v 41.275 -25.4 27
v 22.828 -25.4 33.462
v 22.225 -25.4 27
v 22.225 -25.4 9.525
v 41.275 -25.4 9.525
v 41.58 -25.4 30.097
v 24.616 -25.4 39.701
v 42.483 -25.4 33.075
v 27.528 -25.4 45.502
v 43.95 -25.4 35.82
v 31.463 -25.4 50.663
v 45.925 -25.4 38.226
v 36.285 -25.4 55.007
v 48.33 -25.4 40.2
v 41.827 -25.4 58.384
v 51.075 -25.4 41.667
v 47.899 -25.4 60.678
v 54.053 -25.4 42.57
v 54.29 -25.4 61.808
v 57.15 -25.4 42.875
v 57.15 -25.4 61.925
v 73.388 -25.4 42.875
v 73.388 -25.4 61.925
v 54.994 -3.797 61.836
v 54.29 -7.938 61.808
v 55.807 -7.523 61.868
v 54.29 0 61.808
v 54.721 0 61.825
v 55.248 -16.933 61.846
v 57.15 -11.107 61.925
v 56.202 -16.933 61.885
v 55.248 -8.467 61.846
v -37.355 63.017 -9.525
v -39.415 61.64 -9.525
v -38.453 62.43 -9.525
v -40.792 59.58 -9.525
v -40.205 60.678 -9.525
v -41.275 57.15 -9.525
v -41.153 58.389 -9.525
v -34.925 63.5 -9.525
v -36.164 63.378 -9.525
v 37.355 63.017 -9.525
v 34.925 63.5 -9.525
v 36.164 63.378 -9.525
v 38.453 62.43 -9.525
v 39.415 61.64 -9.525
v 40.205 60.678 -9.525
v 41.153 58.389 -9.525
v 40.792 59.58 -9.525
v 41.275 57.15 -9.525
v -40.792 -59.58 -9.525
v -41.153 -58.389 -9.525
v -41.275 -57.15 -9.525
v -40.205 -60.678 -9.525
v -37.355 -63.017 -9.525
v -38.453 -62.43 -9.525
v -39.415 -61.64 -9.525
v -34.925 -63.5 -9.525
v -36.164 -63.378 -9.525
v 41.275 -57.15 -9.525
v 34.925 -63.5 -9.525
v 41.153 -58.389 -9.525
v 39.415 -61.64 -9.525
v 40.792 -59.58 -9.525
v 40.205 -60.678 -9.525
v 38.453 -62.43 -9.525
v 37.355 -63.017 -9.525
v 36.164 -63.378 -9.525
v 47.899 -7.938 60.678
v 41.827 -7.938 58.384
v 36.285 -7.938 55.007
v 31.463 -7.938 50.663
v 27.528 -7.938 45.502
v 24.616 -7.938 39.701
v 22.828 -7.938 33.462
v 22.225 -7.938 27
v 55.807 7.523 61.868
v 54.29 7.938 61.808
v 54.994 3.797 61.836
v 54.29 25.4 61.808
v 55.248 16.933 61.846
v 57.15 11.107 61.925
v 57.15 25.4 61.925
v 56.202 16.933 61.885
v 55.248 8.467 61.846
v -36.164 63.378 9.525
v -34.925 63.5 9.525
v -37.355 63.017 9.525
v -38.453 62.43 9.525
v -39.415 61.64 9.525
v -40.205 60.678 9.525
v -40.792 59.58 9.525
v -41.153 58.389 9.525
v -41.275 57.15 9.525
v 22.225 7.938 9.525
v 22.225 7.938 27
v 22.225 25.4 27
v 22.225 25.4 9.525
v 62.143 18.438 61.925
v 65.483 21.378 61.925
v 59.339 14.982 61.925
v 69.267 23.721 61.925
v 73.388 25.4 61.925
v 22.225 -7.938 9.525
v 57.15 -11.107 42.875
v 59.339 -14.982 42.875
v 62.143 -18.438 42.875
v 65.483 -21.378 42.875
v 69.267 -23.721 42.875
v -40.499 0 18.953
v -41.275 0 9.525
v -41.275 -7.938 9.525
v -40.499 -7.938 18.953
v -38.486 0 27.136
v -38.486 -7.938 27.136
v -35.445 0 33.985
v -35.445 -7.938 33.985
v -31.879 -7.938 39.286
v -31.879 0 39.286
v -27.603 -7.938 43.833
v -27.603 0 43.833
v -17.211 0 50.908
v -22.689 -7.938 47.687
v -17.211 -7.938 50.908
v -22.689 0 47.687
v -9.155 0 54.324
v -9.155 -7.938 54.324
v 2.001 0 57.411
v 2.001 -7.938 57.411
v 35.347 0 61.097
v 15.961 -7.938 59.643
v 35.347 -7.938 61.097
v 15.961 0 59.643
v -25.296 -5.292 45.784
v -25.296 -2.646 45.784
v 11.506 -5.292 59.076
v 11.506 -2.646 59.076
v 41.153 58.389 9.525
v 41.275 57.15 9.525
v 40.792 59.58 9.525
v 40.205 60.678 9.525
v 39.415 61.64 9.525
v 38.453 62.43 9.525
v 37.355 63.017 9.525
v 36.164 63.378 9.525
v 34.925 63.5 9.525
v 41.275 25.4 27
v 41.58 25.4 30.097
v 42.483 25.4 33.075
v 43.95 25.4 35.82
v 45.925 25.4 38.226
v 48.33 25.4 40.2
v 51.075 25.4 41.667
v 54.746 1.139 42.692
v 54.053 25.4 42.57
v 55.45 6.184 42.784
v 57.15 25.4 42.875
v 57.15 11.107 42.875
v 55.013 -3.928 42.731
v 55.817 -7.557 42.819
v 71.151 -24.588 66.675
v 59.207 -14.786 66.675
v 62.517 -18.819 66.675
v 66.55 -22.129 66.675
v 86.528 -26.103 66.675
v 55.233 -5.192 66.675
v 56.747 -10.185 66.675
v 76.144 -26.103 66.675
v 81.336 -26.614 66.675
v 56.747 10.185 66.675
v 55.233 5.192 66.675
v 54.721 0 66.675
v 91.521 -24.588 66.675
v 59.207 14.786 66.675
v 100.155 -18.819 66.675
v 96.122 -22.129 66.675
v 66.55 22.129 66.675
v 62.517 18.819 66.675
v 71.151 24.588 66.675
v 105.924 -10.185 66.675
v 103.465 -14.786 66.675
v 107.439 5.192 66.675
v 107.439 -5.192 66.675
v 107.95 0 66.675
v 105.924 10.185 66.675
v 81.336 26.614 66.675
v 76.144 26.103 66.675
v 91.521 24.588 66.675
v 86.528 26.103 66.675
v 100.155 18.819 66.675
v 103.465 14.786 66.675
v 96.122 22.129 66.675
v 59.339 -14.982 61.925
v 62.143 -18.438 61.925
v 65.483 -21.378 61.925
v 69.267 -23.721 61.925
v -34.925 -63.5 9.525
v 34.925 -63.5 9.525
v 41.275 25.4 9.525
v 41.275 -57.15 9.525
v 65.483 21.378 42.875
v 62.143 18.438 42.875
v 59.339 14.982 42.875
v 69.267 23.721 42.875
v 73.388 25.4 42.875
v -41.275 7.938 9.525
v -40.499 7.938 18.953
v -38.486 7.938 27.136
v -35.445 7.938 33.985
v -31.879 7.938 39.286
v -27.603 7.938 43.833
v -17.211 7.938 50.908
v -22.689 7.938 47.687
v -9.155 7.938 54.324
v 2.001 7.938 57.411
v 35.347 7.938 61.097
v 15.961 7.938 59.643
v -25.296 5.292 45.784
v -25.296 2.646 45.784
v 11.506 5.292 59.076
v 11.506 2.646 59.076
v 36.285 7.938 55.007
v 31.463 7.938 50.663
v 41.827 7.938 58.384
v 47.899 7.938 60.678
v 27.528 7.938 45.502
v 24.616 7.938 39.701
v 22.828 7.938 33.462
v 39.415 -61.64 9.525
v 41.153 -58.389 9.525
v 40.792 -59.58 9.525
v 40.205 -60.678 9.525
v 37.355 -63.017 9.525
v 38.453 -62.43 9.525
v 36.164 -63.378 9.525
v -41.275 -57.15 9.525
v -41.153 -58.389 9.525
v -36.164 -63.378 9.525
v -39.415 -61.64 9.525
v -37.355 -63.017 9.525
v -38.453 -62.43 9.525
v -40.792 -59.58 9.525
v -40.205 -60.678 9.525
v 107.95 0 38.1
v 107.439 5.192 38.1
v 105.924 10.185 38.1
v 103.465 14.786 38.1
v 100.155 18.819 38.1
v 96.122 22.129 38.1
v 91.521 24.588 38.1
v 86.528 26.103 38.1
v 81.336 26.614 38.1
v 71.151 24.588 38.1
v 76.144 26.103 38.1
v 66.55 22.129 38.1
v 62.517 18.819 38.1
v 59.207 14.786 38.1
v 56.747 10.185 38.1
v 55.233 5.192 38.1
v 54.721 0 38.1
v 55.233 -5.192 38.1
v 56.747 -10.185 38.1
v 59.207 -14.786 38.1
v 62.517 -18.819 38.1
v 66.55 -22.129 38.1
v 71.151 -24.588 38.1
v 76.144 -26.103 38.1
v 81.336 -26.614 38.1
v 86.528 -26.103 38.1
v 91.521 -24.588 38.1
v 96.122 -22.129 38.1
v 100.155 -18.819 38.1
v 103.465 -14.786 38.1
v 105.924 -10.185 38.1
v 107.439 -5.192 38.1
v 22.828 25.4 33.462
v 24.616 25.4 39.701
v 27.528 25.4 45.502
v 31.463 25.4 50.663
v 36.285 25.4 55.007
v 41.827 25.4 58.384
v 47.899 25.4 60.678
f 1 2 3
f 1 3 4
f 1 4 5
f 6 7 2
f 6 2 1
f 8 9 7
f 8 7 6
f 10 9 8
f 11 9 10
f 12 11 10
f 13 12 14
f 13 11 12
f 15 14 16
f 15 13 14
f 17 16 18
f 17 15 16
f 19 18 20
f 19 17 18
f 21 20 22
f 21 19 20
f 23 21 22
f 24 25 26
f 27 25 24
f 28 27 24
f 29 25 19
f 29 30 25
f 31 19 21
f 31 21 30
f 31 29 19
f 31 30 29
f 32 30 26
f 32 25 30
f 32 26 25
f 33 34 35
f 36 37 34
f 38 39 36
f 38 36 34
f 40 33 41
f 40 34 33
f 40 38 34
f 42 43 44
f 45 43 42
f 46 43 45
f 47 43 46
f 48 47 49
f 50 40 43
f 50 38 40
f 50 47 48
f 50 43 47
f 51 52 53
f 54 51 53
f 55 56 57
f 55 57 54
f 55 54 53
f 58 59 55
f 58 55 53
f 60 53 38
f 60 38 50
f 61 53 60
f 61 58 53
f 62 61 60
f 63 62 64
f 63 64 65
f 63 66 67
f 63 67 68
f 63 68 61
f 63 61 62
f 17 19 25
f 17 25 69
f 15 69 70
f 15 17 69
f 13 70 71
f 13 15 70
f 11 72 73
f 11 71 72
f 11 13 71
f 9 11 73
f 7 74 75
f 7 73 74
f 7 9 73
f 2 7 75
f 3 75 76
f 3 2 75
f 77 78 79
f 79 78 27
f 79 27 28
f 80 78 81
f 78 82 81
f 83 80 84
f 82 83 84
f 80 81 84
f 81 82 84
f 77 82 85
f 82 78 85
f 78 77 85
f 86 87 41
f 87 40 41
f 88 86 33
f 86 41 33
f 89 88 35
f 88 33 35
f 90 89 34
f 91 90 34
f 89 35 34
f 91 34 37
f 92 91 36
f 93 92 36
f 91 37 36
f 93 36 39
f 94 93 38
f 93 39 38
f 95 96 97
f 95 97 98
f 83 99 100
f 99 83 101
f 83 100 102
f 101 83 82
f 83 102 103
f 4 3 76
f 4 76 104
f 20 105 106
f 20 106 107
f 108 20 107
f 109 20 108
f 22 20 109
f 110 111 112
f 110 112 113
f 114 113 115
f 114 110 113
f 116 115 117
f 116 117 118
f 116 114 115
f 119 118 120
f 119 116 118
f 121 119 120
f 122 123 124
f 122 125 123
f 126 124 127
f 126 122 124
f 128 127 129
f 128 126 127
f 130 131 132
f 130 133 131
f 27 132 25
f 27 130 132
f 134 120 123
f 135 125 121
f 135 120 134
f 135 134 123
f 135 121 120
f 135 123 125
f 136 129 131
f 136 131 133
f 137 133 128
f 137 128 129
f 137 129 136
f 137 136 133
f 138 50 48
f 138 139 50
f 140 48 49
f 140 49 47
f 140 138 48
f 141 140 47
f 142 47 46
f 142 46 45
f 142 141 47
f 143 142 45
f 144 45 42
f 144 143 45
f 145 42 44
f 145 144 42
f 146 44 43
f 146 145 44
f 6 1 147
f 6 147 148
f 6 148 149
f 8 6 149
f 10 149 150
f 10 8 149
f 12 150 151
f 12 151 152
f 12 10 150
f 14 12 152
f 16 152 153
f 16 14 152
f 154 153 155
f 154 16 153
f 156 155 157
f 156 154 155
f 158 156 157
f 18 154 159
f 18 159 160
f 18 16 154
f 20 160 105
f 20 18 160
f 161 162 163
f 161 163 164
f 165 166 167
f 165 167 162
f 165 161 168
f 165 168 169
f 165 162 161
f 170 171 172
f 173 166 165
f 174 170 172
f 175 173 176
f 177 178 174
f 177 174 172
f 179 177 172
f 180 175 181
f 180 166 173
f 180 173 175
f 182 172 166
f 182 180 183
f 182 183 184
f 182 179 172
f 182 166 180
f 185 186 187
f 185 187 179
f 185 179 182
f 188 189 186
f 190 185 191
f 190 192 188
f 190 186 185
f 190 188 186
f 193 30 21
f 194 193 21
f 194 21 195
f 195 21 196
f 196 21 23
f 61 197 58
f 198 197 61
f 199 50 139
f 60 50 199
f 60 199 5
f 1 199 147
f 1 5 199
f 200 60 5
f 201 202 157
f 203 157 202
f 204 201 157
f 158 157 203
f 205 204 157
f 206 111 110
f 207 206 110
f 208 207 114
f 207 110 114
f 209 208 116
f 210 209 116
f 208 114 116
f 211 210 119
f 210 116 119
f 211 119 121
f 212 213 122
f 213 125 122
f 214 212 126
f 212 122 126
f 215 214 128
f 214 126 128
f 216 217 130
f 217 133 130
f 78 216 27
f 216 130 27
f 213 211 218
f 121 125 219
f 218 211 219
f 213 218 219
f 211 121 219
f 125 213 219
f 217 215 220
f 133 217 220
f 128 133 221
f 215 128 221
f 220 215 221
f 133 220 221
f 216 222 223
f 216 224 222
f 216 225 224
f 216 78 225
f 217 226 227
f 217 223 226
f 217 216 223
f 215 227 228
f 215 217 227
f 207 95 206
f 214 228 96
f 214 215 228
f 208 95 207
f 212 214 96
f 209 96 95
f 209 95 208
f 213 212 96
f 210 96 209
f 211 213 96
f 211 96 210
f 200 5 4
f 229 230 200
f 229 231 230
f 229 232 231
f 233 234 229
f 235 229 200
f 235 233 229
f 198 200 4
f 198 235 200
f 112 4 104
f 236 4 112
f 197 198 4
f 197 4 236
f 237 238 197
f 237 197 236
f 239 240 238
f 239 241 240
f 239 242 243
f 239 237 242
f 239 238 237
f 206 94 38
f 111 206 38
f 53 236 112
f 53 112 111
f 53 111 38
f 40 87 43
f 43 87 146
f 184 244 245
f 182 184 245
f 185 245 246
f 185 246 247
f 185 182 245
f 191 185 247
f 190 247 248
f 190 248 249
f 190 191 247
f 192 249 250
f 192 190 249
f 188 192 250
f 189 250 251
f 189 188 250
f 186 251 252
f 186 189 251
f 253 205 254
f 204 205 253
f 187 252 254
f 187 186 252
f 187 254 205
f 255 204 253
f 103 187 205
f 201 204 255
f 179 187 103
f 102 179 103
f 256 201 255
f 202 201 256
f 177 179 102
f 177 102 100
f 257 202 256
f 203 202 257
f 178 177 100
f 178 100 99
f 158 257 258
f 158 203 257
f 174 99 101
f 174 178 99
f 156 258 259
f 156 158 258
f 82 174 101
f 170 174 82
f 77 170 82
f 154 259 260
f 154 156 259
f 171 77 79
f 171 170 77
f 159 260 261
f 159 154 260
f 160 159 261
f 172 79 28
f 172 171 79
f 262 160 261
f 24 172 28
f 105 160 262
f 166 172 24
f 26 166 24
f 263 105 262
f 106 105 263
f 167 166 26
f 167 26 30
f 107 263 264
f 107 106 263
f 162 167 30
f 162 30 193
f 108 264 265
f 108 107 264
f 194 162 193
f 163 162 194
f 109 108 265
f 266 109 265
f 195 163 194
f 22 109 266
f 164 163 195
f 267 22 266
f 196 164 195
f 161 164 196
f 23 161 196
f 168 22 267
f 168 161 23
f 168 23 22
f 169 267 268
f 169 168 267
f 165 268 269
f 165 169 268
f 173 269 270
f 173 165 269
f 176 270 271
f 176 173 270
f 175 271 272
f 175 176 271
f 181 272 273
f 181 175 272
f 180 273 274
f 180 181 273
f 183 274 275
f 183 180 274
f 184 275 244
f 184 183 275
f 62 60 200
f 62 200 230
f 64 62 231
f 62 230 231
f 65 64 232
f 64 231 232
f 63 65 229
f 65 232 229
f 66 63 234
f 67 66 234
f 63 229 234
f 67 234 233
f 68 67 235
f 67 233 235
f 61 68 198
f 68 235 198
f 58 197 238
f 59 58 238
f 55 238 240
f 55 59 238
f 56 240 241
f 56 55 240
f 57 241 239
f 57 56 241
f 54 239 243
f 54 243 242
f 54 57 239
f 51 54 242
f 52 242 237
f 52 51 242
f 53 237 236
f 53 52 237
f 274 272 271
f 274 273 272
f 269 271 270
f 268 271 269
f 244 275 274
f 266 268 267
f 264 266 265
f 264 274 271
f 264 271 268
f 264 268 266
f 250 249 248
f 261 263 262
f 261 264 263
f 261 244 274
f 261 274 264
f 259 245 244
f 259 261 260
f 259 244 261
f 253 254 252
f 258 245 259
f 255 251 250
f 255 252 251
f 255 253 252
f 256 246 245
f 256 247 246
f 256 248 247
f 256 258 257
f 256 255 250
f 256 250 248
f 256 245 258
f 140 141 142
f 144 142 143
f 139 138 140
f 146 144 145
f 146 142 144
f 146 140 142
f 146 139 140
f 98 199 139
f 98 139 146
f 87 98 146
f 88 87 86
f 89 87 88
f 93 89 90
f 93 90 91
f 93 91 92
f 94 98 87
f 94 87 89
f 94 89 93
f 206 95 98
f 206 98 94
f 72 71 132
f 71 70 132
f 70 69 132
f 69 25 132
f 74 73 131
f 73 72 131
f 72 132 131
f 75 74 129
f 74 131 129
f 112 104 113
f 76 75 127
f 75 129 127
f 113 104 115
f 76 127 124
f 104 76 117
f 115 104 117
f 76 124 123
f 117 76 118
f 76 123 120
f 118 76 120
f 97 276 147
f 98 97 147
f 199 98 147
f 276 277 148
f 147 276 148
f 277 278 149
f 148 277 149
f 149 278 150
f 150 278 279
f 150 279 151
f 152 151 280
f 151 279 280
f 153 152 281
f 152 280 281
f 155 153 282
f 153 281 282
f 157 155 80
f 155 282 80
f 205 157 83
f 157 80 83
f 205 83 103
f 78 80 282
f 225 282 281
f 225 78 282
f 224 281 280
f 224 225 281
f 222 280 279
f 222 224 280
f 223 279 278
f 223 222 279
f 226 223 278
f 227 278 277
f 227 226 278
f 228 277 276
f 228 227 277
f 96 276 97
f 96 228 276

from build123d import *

# Parameters (mm, degrees)
F1_DEPTH = 63.5
F0_W     = 24.1857025899
F0_H     = 19.05
F2_DEPTH = 25.4
F3_DEPTH = 7.9375
F5_R     = 6.35


with BuildPart() as f1:
    # F0 (on Front) → F1 (new body, symmetric)
    with BuildSketch(Plane.XZ):
        Polygon((22.225, 9.525), (-41.275, 9.525), (-41.275, -9.525), (41.275, -9.525), (41.275, 9.525), align=None)
    extrude(amount=F1_DEPTH, both=True)

    # F0 (on Front) → F2 (join, symmetric)
    with BuildSketch(Plane.XZ):
        with BuildLine():
            Line((22.225, 27.0002), (22.225, 9.525))
            Line((22.225, 9.525), (41.275, 9.525))
            Line((41.275, 9.525), (41.275, 27.0002))
            ThreePointArc((41.275, 27.0002), (45.9246798487, 38.2255201513), (57.15, 42.8752))
            Line((57.15, 42.8752), (57.15, 61.9252))
            add(Edge.make_bspline(
                [(54.2900015648, 61.8079007852), (55.2509849967, 61.8452258423), (56.2046080591, 61.8840829618), (57.15, 61.9252)],
                knots=[108.9404327858, 108.9404327858, 108.9404327858, 108.9404327858, 111.5045361635, 111.5045361635, 111.5045361635, 111.5045361635], degree=3))
            ThreePointArc((54.2900015648, 61.8079007852), (31.4630279096, 50.6631476149), (22.225, 27.0002))
        make_face()
        with Locations((69.2428512949, 52.4002)):
            Rectangle(F0_W, F0_H)
    extrude(amount=F2_DEPTH, both=True)

    # F0 (on Front) → F3 (join, symmetric)
    with BuildSketch(Plane.XZ):
        with BuildLine():
            add(Edge.make_bspline(
                [(-41.275, 9.525), (-40.6545165411, 61.4018227943), (13.4609336457, 60.2220802175), (54.2900015648, 61.8079007852)],
                knots=[0, 0, 0, 0, 108.9404327858, 108.9404327858, 108.9404327858, 108.9404327858], degree=3))
            Line((-41.275, 9.525), (22.225, 9.525))
            Line((22.225, 9.525), (22.225, 27.0002))
            ThreePointArc((22.225, 27.0002), (31.4630279096, 50.6631476149), (54.2900015648, 61.8079007852))
        make_face()
    extrude(amount=F3_DEPTH, both=True)

    # F0 (on Front) → F4 (revolve)
    with BuildSketch(Plane.XZ):
        Polygon((81.3357025899, 66.675), (81.3357025899, 61.9252), (81.3357025899, 42.8752), (81.3357025899, 38.1), (107.95, 38.1), (107.95, 66.675), align=None)
    revolve(axis=Axis((81.3357025899, 0, 52.3875), (0, 0, 1)))

    # F5
    f5_edges = [f1.edges().sort_by_distance(p)[0] for p in [
        (41.275, -63.5, 0),
        (-41.275, -63.5, 0),
        (41.275, 63.5, 0),
        (-41.275, 63.5, 0),
    ]]
    fillet(f5_edges, radius=F5_R)


solid = f1.part
